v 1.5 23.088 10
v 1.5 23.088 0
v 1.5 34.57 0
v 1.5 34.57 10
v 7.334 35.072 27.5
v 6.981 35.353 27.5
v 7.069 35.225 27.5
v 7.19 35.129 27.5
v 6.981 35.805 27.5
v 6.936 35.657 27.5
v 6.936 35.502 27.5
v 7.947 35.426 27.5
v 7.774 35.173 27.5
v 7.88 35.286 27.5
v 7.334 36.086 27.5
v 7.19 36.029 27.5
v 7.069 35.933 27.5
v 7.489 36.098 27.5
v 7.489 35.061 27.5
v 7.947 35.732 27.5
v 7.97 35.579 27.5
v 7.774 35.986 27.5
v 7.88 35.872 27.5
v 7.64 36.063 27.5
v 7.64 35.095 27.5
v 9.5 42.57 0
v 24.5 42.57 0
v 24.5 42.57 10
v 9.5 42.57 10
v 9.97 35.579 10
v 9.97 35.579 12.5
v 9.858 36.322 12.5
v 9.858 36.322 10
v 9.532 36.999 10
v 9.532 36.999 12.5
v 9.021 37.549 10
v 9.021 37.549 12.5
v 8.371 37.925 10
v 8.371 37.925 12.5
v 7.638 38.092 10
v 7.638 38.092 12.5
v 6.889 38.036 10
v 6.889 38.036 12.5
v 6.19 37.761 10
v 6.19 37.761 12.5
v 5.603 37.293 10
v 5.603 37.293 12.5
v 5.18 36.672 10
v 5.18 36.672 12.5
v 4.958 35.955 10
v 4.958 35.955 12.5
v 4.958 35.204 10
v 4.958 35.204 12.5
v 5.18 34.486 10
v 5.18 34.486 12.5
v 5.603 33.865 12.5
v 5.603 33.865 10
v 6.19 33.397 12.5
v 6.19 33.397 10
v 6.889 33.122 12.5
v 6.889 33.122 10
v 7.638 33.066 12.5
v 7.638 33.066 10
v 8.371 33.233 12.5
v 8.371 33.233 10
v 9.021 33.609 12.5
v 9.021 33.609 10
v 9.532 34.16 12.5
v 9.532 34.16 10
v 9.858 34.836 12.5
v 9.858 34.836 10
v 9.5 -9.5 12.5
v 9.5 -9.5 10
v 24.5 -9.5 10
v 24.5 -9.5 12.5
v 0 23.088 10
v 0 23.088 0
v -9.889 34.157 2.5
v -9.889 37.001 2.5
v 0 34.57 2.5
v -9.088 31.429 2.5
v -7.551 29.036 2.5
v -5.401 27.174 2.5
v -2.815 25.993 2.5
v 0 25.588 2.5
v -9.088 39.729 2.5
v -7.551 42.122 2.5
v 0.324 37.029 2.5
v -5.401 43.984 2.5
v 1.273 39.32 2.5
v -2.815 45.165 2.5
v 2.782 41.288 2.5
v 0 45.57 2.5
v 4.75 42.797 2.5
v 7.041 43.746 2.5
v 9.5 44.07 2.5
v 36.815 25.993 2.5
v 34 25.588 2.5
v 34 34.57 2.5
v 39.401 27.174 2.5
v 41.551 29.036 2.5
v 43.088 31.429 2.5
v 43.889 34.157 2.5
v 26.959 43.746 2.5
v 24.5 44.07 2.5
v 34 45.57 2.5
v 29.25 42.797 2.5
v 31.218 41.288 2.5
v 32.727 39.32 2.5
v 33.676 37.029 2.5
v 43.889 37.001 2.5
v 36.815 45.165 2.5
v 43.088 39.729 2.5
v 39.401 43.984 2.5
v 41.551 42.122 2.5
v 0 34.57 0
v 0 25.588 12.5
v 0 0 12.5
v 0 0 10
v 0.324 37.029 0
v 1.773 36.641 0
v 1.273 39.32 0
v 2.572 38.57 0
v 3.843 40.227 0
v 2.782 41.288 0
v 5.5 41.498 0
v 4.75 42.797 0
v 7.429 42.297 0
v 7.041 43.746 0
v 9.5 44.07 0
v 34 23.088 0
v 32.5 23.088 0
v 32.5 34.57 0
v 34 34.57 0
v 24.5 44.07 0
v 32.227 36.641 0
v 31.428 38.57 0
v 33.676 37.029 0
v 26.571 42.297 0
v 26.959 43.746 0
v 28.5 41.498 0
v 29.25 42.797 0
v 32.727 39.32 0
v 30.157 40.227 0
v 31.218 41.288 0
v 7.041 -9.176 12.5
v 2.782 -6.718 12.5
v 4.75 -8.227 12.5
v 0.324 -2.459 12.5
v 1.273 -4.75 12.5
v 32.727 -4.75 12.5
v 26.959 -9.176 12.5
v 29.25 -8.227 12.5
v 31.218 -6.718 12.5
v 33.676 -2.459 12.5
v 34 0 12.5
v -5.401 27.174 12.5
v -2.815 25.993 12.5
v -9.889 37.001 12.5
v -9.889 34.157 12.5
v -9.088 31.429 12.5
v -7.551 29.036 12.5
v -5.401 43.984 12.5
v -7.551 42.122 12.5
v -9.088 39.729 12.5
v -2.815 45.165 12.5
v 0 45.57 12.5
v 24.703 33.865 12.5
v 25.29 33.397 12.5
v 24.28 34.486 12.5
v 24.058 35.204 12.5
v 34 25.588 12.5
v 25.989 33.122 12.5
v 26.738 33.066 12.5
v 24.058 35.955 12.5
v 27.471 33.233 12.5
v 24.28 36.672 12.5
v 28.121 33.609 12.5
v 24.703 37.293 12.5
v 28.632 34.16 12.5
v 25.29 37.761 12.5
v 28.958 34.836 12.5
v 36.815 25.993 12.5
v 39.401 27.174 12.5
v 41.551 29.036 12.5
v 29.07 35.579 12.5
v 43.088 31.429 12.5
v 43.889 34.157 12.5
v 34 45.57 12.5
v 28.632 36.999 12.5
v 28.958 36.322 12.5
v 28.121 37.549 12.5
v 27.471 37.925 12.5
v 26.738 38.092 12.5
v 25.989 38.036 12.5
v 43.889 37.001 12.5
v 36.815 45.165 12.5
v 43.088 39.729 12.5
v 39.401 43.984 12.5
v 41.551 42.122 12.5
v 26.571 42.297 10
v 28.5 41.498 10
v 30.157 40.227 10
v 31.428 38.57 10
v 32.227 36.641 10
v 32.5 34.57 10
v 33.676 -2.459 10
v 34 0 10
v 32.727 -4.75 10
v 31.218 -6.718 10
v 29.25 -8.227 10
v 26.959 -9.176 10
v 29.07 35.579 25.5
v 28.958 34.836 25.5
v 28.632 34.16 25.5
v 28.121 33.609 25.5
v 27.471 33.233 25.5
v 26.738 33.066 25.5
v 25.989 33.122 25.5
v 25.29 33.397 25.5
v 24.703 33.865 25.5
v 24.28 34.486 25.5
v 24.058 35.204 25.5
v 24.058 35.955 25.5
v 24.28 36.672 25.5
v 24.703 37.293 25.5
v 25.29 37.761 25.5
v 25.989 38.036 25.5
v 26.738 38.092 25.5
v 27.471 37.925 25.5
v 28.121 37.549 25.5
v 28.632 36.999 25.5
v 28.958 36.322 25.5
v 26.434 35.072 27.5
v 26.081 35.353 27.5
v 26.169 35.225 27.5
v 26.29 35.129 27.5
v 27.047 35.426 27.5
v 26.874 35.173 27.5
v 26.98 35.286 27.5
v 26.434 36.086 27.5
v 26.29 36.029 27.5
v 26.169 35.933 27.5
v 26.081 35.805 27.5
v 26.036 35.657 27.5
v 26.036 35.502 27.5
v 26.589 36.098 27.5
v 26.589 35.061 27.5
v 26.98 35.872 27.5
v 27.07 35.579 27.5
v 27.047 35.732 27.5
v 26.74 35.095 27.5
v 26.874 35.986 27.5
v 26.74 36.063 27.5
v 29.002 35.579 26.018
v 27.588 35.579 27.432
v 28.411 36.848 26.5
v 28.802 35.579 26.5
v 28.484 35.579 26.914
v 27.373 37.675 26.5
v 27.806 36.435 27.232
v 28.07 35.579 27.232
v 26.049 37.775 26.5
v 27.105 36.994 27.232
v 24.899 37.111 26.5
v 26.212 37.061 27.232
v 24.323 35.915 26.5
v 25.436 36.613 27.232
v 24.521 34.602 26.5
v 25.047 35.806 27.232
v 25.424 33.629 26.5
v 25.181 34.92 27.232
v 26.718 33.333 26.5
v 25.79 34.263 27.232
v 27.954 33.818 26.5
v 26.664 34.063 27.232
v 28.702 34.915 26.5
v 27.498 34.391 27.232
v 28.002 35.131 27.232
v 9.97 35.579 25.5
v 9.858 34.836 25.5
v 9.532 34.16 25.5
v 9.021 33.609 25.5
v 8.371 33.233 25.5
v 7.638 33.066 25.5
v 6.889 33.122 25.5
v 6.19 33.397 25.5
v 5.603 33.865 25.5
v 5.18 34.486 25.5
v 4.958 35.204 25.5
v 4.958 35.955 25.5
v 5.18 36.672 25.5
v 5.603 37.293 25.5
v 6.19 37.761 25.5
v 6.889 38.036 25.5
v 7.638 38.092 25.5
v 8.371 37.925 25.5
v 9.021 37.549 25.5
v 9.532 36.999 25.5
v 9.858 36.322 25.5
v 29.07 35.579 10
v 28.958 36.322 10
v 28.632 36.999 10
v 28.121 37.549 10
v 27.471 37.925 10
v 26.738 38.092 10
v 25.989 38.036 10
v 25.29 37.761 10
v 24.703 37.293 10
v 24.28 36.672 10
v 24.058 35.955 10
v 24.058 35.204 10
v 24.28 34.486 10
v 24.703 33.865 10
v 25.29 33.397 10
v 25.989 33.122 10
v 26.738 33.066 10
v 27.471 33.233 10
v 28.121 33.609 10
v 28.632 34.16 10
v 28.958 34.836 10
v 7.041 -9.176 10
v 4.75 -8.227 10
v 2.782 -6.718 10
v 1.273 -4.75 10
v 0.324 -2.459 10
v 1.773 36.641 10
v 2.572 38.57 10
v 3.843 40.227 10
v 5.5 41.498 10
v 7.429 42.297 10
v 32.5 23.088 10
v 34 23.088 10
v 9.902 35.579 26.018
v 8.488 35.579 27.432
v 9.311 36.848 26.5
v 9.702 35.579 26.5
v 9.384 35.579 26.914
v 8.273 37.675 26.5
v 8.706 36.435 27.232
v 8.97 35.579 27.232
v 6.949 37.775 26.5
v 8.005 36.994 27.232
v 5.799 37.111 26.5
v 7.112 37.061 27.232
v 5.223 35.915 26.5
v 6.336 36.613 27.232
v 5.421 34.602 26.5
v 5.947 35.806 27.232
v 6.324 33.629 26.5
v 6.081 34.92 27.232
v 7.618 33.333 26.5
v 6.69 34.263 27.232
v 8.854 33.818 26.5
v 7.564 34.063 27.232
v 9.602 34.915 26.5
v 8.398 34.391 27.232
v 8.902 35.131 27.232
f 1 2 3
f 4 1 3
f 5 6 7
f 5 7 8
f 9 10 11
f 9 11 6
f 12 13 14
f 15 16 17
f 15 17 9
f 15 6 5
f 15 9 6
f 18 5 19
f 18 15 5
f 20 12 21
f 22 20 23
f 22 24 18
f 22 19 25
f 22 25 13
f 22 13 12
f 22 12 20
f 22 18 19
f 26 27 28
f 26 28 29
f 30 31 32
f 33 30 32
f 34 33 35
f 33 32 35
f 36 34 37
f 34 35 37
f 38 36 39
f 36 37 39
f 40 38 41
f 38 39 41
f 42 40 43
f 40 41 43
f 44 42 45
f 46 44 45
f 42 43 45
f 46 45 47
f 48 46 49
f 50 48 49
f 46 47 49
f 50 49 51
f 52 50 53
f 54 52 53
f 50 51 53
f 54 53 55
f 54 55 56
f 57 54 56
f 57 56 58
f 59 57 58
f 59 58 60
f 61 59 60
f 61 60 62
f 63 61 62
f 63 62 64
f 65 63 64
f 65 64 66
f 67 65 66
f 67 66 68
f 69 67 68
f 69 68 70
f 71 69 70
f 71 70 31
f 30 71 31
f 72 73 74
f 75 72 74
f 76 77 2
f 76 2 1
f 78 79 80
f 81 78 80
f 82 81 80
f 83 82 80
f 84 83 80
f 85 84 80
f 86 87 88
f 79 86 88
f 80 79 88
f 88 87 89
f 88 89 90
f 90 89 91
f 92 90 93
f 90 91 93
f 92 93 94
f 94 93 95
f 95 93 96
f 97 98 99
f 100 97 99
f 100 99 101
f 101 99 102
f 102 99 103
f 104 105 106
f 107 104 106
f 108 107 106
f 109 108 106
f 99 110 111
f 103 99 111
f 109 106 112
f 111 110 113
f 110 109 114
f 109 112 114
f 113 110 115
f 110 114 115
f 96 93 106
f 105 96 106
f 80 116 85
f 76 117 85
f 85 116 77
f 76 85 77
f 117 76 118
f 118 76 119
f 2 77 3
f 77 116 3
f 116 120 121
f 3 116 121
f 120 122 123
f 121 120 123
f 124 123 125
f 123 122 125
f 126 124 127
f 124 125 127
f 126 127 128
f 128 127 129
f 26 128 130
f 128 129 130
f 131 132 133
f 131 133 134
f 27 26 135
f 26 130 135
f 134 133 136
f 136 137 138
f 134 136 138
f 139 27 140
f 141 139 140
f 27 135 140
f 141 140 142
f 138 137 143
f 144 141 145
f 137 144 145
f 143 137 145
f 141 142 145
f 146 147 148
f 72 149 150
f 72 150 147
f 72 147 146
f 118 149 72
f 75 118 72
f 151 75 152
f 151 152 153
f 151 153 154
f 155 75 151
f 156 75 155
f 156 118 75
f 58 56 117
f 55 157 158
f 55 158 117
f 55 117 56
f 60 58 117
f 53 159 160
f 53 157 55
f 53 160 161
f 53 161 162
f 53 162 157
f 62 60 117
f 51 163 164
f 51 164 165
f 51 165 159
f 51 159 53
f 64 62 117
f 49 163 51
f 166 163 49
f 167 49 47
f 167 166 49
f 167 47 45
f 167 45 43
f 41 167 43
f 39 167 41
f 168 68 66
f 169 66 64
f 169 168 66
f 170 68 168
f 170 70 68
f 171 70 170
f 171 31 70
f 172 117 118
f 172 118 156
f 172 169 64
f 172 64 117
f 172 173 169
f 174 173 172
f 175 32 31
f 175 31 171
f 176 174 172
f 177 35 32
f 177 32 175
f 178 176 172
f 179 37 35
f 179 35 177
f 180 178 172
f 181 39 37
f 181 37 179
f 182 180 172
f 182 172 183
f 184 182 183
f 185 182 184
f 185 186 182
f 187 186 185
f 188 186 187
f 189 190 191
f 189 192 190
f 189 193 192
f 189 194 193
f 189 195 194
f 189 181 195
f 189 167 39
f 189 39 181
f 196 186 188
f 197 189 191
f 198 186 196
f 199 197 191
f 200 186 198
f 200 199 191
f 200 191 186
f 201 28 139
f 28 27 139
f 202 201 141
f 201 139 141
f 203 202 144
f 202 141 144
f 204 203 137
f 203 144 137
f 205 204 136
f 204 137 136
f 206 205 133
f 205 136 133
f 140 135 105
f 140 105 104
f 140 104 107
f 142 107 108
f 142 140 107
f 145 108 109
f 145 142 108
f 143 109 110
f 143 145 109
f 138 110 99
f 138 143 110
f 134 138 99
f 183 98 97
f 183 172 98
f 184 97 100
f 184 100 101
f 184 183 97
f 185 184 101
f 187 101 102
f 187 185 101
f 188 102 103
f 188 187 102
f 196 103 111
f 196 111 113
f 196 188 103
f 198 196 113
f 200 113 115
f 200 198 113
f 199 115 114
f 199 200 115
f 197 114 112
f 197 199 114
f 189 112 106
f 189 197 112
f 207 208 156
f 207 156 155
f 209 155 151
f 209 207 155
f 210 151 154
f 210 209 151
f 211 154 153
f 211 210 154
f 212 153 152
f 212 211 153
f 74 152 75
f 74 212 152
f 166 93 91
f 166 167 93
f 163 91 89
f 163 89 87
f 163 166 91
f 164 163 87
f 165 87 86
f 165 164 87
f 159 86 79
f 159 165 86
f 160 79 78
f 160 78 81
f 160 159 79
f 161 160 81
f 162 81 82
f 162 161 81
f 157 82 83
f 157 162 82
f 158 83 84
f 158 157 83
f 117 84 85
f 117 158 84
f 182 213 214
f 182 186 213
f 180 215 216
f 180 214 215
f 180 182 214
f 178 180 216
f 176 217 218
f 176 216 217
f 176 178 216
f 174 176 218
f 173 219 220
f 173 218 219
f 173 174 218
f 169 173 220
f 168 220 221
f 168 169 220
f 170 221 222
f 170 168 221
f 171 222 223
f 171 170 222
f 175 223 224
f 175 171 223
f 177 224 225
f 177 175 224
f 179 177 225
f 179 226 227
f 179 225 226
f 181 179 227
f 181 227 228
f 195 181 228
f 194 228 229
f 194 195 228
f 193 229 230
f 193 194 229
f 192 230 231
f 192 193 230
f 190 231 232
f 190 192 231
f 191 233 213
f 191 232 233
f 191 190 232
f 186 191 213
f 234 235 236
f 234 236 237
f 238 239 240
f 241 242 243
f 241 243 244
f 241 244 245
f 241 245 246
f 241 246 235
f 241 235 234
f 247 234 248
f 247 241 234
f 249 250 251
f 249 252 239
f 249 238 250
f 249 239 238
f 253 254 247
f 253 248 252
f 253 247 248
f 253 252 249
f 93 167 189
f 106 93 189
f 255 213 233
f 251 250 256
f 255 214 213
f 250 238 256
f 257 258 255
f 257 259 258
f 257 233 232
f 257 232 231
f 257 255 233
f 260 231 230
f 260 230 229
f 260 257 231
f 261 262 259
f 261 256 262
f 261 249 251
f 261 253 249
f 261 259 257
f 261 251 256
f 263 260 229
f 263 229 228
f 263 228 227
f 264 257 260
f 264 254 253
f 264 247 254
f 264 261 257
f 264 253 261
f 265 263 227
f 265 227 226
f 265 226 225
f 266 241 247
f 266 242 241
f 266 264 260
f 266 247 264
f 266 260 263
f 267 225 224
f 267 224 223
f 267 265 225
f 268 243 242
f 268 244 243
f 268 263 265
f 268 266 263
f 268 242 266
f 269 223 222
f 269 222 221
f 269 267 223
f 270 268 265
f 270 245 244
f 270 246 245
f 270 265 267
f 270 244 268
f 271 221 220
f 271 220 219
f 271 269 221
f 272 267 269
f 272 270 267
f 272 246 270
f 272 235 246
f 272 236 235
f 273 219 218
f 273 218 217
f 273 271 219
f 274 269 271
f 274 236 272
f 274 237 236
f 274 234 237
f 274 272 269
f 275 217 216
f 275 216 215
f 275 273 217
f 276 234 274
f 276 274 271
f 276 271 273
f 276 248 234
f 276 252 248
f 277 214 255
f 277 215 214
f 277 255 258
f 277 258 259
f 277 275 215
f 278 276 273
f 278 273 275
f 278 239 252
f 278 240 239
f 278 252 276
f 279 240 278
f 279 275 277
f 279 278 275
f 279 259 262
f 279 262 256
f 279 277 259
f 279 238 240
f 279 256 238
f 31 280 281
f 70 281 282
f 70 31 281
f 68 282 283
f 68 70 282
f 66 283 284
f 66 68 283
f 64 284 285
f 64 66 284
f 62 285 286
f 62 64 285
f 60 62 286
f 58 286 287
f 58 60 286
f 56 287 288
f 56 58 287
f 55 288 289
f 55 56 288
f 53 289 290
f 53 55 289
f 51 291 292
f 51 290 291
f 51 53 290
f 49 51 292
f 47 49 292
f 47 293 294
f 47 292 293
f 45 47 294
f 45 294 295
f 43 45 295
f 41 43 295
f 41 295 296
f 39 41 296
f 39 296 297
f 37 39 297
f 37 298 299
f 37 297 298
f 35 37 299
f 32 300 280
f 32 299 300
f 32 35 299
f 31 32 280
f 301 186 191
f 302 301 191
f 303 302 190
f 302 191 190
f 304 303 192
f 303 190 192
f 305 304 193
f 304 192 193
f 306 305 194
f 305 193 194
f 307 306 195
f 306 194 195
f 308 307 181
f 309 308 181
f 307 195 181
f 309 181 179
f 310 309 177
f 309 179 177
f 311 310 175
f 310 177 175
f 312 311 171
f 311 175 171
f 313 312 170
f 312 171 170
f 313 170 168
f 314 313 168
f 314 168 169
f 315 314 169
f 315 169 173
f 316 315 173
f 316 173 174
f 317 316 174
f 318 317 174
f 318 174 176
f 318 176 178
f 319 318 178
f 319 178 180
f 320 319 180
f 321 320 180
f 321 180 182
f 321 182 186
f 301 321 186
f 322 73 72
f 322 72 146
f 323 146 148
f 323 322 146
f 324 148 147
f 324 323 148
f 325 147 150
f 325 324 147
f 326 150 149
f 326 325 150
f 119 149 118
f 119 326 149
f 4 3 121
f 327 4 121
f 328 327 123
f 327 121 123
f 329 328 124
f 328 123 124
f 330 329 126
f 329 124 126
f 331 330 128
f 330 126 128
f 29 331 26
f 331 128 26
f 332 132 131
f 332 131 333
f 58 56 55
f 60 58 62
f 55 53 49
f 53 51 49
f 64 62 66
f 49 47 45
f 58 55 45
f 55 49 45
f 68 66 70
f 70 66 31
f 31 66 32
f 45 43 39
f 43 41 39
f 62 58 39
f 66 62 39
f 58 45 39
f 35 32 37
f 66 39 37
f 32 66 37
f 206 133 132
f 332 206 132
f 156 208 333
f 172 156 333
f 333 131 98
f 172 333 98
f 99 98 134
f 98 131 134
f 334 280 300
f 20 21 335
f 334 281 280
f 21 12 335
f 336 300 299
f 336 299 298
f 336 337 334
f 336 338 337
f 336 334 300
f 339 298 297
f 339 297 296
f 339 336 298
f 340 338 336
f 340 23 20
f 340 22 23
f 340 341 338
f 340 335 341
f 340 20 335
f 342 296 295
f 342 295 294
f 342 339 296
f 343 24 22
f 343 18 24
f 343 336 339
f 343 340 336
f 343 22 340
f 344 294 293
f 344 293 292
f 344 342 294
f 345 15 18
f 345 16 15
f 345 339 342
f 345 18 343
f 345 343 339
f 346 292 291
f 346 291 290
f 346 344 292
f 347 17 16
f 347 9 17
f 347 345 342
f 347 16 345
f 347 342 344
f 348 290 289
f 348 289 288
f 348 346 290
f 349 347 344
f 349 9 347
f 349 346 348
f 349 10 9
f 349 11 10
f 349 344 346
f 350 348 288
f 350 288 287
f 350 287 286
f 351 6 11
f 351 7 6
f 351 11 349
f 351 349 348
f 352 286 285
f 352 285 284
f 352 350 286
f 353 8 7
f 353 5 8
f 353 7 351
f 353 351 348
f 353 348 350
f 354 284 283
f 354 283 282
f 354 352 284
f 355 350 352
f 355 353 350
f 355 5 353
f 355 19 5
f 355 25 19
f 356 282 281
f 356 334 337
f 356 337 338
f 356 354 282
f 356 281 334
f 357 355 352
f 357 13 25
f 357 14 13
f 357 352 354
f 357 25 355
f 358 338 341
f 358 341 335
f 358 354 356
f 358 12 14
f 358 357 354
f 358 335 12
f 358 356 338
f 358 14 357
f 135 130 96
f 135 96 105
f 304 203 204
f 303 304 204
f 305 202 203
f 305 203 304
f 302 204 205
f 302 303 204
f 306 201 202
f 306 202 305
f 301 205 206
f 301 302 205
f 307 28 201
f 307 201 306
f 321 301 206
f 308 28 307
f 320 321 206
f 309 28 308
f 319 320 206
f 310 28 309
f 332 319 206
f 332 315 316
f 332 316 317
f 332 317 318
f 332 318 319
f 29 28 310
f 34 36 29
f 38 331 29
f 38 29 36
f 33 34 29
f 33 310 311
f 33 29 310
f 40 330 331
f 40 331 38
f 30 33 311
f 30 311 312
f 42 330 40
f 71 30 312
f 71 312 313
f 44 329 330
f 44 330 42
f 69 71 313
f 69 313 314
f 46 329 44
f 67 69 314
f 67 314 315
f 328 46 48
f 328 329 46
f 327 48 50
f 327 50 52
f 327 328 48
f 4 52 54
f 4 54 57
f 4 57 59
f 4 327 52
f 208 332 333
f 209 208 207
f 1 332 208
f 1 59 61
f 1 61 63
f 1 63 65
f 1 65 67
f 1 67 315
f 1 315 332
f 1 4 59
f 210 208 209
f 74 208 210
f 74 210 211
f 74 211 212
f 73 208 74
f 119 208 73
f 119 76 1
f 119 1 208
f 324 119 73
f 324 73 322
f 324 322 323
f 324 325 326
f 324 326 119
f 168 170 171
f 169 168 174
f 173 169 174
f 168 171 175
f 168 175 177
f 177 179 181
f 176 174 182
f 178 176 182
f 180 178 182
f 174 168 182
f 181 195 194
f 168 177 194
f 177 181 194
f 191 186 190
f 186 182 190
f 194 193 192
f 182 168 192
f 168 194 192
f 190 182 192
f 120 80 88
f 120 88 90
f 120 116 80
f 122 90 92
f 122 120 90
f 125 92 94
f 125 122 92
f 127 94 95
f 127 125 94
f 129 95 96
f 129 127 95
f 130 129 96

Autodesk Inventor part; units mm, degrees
ref_plane "YZ Plane" through (0, 0, 0) normal (1, 0, 0) x (0, 1, 0)
ref_plane "XZ Plane" through (0, 0, 0) normal (0, 1, 0) x (-1, 0, 0)
ref_plane "XY Plane" through (0, 0, 0) normal (0, 0, 1) x (1, 0, 0)
sketch "Sketch2" plane through (0, 0, 0) normal (0, 0, 1) x (1, 0, 0)
  line L0 (0, 34.57) -> (0, 0)
  line L1 (9.5, -9.5) -> (24.5, -9.5)
  line L2 (34, 0) -> (34, 34.57)
  line L3 (9.5, 44.07) -> (24.5, 44.07)
  arc A0 (9.5, 44.07) -> (0, 34.57) centre (9.5, 34.57) ccw
  arc A1 (34, 34.57) -> (24.5, 44.07) centre (24.5, 34.57) ccw
  arc A2 (24.5, -9.5) -> (34, 0) centre (24.5, 0) ccw
  arc A3 (0, 0) -> (9.5, -9.5) centre (9.5, 0) ccw
  point P0 (0, 0)
  dimension "d5" = 9.5
  dimension "d6" = 15
  dimension "d23" = 53.57
extrude "Extrusion2" add sketch "Sketch2" along normal blind 12.5
sketch "Sketch3" plane through (0, 0, 0) normal (-1, 0, 0) x (0, 0, 1)
  line L0 (0, -9.5) -> (12.5, -9.5) projected
  line L1 (0, 23.0882) -> (10, 23.0882)
  line L2 (10, 23.0882) -> (10, -9.5)
  line L3 (10, -9.5) -> (0, -9.5)
  line L4 (0, -9.5) -> (0, 23.0882)
  line L5 (0, 34.57) -> (0, 0) projected
  dimension "d9" = 32.5882
  dimension "d10" = 10
extrude "Extrusion3" cut sketch "Sketch3" against normal through all
sketch "Sketch4" plane through (0, 0, 0) normal (0, 0, -1) x (-1, 0, 0)
  line L0 (-32.5, 34.57) -> (-32.5, 23.0882)
  line L1 (0, 23.0882) -> (-34, 23.0882) projected
  line L2 (-32.5, 23.0882) -> (-1.5, 23.0882)
  line L3 (-1.5, 23.0882) -> (-1.5, 34.57)
  line L4 (-24.5, 42.57) -> (-9.5, 42.57)
  arc A0 (-1.5, 34.57) -> (-9.5, 42.57) centre (-9.5, 34.57) ccw
  arc A1 (-24.5, 42.57) -> (-32.5, 34.57) centre (-24.5, 34.57) ccw
  arc A2 (-24.5, 44.07) -> (-34, 34.57) centre (-24.5, 34.57) ccw projected
  point P0 (0, 0)
  dimension "d13" = 15
  dimension "d14" = 8
sketch "Sketch8" plane through (0, 0, 12.5) normal (0, 0, 1) x (1, 0, 0)
  line L0 (0, 45.57) -> (34, 45.57)
  line L1 (0, 25.5882) -> (34, 25.5882)
  line L2 (34, 0) -> (34, 34.57) projected
  line L3 (0, 34.57) -> (0, 0) projected
  line L4 (24.5, 44.07) -> (9.5, 44.07) projected
  line L5 (24.5, 44.07) -> (9.5, 44.07) projected
  arc A0 (0, 45.57) -> (0, 25.5882) centre (0, 35.5791) ccw
  arc A1 (34, 25.5882) -> (34, 45.57) centre (34, 35.5791) ccw
  point P0 (0, 23.0882)
  point P1 (17, 45.57)
  point P2 (17, 44.07)
  dimension "d25" = 1.5
  dimension "d26" = 2.5
  dimension "d40" = 0
extrude "Extrusion7" add sketch "Sketch8" against normal blind 10
extrude "Extrusion6" cut sketch "Sketch4" against normal up to surface (10 mm away)
sketch "Sketch10" plane through (0, 0, 12.5) normal (0, 0, 1) x (1, 0, 0)
  circle A0 centre (7.45, 35.5791) radius 2.52
  circle A1 centre (26.55, 35.5791) radius 2.52
  line L0 (7.45, 35.5791) -> (0, 35.5791)
  line L1 (34, 35.5791) -> (26.55, 35.5791)
  point P0 (0, 0)
  dimension "d29" = 19.1
  dimension "d30" = 5.04
  dimension "d31" = 0
  dimension "d32" = 0
extrude "Extrusion8" cut sketch "Sketch10" against normal blind 10
sketch "Sketch11" plane through (0, 0, 12.5) normal (0, 0, 1) x (1, 0, 0)
  circle A0 centre (7.45, 35.5791) radius 2.52 projected
  circle A1 centre (26.55, 35.5791) radius 2.52 projected
  point P0 (0, 0)
extrude "Extrusion9" add sketch "Sketch11" along normal blind 15
fillet "Fillet1" radius 2 2 edges at (4.93, 35.5791, 27.5) (24.03, 35.5791, 27.5)
properties part number "charger cover pt2" material "Iron, Malleable"
